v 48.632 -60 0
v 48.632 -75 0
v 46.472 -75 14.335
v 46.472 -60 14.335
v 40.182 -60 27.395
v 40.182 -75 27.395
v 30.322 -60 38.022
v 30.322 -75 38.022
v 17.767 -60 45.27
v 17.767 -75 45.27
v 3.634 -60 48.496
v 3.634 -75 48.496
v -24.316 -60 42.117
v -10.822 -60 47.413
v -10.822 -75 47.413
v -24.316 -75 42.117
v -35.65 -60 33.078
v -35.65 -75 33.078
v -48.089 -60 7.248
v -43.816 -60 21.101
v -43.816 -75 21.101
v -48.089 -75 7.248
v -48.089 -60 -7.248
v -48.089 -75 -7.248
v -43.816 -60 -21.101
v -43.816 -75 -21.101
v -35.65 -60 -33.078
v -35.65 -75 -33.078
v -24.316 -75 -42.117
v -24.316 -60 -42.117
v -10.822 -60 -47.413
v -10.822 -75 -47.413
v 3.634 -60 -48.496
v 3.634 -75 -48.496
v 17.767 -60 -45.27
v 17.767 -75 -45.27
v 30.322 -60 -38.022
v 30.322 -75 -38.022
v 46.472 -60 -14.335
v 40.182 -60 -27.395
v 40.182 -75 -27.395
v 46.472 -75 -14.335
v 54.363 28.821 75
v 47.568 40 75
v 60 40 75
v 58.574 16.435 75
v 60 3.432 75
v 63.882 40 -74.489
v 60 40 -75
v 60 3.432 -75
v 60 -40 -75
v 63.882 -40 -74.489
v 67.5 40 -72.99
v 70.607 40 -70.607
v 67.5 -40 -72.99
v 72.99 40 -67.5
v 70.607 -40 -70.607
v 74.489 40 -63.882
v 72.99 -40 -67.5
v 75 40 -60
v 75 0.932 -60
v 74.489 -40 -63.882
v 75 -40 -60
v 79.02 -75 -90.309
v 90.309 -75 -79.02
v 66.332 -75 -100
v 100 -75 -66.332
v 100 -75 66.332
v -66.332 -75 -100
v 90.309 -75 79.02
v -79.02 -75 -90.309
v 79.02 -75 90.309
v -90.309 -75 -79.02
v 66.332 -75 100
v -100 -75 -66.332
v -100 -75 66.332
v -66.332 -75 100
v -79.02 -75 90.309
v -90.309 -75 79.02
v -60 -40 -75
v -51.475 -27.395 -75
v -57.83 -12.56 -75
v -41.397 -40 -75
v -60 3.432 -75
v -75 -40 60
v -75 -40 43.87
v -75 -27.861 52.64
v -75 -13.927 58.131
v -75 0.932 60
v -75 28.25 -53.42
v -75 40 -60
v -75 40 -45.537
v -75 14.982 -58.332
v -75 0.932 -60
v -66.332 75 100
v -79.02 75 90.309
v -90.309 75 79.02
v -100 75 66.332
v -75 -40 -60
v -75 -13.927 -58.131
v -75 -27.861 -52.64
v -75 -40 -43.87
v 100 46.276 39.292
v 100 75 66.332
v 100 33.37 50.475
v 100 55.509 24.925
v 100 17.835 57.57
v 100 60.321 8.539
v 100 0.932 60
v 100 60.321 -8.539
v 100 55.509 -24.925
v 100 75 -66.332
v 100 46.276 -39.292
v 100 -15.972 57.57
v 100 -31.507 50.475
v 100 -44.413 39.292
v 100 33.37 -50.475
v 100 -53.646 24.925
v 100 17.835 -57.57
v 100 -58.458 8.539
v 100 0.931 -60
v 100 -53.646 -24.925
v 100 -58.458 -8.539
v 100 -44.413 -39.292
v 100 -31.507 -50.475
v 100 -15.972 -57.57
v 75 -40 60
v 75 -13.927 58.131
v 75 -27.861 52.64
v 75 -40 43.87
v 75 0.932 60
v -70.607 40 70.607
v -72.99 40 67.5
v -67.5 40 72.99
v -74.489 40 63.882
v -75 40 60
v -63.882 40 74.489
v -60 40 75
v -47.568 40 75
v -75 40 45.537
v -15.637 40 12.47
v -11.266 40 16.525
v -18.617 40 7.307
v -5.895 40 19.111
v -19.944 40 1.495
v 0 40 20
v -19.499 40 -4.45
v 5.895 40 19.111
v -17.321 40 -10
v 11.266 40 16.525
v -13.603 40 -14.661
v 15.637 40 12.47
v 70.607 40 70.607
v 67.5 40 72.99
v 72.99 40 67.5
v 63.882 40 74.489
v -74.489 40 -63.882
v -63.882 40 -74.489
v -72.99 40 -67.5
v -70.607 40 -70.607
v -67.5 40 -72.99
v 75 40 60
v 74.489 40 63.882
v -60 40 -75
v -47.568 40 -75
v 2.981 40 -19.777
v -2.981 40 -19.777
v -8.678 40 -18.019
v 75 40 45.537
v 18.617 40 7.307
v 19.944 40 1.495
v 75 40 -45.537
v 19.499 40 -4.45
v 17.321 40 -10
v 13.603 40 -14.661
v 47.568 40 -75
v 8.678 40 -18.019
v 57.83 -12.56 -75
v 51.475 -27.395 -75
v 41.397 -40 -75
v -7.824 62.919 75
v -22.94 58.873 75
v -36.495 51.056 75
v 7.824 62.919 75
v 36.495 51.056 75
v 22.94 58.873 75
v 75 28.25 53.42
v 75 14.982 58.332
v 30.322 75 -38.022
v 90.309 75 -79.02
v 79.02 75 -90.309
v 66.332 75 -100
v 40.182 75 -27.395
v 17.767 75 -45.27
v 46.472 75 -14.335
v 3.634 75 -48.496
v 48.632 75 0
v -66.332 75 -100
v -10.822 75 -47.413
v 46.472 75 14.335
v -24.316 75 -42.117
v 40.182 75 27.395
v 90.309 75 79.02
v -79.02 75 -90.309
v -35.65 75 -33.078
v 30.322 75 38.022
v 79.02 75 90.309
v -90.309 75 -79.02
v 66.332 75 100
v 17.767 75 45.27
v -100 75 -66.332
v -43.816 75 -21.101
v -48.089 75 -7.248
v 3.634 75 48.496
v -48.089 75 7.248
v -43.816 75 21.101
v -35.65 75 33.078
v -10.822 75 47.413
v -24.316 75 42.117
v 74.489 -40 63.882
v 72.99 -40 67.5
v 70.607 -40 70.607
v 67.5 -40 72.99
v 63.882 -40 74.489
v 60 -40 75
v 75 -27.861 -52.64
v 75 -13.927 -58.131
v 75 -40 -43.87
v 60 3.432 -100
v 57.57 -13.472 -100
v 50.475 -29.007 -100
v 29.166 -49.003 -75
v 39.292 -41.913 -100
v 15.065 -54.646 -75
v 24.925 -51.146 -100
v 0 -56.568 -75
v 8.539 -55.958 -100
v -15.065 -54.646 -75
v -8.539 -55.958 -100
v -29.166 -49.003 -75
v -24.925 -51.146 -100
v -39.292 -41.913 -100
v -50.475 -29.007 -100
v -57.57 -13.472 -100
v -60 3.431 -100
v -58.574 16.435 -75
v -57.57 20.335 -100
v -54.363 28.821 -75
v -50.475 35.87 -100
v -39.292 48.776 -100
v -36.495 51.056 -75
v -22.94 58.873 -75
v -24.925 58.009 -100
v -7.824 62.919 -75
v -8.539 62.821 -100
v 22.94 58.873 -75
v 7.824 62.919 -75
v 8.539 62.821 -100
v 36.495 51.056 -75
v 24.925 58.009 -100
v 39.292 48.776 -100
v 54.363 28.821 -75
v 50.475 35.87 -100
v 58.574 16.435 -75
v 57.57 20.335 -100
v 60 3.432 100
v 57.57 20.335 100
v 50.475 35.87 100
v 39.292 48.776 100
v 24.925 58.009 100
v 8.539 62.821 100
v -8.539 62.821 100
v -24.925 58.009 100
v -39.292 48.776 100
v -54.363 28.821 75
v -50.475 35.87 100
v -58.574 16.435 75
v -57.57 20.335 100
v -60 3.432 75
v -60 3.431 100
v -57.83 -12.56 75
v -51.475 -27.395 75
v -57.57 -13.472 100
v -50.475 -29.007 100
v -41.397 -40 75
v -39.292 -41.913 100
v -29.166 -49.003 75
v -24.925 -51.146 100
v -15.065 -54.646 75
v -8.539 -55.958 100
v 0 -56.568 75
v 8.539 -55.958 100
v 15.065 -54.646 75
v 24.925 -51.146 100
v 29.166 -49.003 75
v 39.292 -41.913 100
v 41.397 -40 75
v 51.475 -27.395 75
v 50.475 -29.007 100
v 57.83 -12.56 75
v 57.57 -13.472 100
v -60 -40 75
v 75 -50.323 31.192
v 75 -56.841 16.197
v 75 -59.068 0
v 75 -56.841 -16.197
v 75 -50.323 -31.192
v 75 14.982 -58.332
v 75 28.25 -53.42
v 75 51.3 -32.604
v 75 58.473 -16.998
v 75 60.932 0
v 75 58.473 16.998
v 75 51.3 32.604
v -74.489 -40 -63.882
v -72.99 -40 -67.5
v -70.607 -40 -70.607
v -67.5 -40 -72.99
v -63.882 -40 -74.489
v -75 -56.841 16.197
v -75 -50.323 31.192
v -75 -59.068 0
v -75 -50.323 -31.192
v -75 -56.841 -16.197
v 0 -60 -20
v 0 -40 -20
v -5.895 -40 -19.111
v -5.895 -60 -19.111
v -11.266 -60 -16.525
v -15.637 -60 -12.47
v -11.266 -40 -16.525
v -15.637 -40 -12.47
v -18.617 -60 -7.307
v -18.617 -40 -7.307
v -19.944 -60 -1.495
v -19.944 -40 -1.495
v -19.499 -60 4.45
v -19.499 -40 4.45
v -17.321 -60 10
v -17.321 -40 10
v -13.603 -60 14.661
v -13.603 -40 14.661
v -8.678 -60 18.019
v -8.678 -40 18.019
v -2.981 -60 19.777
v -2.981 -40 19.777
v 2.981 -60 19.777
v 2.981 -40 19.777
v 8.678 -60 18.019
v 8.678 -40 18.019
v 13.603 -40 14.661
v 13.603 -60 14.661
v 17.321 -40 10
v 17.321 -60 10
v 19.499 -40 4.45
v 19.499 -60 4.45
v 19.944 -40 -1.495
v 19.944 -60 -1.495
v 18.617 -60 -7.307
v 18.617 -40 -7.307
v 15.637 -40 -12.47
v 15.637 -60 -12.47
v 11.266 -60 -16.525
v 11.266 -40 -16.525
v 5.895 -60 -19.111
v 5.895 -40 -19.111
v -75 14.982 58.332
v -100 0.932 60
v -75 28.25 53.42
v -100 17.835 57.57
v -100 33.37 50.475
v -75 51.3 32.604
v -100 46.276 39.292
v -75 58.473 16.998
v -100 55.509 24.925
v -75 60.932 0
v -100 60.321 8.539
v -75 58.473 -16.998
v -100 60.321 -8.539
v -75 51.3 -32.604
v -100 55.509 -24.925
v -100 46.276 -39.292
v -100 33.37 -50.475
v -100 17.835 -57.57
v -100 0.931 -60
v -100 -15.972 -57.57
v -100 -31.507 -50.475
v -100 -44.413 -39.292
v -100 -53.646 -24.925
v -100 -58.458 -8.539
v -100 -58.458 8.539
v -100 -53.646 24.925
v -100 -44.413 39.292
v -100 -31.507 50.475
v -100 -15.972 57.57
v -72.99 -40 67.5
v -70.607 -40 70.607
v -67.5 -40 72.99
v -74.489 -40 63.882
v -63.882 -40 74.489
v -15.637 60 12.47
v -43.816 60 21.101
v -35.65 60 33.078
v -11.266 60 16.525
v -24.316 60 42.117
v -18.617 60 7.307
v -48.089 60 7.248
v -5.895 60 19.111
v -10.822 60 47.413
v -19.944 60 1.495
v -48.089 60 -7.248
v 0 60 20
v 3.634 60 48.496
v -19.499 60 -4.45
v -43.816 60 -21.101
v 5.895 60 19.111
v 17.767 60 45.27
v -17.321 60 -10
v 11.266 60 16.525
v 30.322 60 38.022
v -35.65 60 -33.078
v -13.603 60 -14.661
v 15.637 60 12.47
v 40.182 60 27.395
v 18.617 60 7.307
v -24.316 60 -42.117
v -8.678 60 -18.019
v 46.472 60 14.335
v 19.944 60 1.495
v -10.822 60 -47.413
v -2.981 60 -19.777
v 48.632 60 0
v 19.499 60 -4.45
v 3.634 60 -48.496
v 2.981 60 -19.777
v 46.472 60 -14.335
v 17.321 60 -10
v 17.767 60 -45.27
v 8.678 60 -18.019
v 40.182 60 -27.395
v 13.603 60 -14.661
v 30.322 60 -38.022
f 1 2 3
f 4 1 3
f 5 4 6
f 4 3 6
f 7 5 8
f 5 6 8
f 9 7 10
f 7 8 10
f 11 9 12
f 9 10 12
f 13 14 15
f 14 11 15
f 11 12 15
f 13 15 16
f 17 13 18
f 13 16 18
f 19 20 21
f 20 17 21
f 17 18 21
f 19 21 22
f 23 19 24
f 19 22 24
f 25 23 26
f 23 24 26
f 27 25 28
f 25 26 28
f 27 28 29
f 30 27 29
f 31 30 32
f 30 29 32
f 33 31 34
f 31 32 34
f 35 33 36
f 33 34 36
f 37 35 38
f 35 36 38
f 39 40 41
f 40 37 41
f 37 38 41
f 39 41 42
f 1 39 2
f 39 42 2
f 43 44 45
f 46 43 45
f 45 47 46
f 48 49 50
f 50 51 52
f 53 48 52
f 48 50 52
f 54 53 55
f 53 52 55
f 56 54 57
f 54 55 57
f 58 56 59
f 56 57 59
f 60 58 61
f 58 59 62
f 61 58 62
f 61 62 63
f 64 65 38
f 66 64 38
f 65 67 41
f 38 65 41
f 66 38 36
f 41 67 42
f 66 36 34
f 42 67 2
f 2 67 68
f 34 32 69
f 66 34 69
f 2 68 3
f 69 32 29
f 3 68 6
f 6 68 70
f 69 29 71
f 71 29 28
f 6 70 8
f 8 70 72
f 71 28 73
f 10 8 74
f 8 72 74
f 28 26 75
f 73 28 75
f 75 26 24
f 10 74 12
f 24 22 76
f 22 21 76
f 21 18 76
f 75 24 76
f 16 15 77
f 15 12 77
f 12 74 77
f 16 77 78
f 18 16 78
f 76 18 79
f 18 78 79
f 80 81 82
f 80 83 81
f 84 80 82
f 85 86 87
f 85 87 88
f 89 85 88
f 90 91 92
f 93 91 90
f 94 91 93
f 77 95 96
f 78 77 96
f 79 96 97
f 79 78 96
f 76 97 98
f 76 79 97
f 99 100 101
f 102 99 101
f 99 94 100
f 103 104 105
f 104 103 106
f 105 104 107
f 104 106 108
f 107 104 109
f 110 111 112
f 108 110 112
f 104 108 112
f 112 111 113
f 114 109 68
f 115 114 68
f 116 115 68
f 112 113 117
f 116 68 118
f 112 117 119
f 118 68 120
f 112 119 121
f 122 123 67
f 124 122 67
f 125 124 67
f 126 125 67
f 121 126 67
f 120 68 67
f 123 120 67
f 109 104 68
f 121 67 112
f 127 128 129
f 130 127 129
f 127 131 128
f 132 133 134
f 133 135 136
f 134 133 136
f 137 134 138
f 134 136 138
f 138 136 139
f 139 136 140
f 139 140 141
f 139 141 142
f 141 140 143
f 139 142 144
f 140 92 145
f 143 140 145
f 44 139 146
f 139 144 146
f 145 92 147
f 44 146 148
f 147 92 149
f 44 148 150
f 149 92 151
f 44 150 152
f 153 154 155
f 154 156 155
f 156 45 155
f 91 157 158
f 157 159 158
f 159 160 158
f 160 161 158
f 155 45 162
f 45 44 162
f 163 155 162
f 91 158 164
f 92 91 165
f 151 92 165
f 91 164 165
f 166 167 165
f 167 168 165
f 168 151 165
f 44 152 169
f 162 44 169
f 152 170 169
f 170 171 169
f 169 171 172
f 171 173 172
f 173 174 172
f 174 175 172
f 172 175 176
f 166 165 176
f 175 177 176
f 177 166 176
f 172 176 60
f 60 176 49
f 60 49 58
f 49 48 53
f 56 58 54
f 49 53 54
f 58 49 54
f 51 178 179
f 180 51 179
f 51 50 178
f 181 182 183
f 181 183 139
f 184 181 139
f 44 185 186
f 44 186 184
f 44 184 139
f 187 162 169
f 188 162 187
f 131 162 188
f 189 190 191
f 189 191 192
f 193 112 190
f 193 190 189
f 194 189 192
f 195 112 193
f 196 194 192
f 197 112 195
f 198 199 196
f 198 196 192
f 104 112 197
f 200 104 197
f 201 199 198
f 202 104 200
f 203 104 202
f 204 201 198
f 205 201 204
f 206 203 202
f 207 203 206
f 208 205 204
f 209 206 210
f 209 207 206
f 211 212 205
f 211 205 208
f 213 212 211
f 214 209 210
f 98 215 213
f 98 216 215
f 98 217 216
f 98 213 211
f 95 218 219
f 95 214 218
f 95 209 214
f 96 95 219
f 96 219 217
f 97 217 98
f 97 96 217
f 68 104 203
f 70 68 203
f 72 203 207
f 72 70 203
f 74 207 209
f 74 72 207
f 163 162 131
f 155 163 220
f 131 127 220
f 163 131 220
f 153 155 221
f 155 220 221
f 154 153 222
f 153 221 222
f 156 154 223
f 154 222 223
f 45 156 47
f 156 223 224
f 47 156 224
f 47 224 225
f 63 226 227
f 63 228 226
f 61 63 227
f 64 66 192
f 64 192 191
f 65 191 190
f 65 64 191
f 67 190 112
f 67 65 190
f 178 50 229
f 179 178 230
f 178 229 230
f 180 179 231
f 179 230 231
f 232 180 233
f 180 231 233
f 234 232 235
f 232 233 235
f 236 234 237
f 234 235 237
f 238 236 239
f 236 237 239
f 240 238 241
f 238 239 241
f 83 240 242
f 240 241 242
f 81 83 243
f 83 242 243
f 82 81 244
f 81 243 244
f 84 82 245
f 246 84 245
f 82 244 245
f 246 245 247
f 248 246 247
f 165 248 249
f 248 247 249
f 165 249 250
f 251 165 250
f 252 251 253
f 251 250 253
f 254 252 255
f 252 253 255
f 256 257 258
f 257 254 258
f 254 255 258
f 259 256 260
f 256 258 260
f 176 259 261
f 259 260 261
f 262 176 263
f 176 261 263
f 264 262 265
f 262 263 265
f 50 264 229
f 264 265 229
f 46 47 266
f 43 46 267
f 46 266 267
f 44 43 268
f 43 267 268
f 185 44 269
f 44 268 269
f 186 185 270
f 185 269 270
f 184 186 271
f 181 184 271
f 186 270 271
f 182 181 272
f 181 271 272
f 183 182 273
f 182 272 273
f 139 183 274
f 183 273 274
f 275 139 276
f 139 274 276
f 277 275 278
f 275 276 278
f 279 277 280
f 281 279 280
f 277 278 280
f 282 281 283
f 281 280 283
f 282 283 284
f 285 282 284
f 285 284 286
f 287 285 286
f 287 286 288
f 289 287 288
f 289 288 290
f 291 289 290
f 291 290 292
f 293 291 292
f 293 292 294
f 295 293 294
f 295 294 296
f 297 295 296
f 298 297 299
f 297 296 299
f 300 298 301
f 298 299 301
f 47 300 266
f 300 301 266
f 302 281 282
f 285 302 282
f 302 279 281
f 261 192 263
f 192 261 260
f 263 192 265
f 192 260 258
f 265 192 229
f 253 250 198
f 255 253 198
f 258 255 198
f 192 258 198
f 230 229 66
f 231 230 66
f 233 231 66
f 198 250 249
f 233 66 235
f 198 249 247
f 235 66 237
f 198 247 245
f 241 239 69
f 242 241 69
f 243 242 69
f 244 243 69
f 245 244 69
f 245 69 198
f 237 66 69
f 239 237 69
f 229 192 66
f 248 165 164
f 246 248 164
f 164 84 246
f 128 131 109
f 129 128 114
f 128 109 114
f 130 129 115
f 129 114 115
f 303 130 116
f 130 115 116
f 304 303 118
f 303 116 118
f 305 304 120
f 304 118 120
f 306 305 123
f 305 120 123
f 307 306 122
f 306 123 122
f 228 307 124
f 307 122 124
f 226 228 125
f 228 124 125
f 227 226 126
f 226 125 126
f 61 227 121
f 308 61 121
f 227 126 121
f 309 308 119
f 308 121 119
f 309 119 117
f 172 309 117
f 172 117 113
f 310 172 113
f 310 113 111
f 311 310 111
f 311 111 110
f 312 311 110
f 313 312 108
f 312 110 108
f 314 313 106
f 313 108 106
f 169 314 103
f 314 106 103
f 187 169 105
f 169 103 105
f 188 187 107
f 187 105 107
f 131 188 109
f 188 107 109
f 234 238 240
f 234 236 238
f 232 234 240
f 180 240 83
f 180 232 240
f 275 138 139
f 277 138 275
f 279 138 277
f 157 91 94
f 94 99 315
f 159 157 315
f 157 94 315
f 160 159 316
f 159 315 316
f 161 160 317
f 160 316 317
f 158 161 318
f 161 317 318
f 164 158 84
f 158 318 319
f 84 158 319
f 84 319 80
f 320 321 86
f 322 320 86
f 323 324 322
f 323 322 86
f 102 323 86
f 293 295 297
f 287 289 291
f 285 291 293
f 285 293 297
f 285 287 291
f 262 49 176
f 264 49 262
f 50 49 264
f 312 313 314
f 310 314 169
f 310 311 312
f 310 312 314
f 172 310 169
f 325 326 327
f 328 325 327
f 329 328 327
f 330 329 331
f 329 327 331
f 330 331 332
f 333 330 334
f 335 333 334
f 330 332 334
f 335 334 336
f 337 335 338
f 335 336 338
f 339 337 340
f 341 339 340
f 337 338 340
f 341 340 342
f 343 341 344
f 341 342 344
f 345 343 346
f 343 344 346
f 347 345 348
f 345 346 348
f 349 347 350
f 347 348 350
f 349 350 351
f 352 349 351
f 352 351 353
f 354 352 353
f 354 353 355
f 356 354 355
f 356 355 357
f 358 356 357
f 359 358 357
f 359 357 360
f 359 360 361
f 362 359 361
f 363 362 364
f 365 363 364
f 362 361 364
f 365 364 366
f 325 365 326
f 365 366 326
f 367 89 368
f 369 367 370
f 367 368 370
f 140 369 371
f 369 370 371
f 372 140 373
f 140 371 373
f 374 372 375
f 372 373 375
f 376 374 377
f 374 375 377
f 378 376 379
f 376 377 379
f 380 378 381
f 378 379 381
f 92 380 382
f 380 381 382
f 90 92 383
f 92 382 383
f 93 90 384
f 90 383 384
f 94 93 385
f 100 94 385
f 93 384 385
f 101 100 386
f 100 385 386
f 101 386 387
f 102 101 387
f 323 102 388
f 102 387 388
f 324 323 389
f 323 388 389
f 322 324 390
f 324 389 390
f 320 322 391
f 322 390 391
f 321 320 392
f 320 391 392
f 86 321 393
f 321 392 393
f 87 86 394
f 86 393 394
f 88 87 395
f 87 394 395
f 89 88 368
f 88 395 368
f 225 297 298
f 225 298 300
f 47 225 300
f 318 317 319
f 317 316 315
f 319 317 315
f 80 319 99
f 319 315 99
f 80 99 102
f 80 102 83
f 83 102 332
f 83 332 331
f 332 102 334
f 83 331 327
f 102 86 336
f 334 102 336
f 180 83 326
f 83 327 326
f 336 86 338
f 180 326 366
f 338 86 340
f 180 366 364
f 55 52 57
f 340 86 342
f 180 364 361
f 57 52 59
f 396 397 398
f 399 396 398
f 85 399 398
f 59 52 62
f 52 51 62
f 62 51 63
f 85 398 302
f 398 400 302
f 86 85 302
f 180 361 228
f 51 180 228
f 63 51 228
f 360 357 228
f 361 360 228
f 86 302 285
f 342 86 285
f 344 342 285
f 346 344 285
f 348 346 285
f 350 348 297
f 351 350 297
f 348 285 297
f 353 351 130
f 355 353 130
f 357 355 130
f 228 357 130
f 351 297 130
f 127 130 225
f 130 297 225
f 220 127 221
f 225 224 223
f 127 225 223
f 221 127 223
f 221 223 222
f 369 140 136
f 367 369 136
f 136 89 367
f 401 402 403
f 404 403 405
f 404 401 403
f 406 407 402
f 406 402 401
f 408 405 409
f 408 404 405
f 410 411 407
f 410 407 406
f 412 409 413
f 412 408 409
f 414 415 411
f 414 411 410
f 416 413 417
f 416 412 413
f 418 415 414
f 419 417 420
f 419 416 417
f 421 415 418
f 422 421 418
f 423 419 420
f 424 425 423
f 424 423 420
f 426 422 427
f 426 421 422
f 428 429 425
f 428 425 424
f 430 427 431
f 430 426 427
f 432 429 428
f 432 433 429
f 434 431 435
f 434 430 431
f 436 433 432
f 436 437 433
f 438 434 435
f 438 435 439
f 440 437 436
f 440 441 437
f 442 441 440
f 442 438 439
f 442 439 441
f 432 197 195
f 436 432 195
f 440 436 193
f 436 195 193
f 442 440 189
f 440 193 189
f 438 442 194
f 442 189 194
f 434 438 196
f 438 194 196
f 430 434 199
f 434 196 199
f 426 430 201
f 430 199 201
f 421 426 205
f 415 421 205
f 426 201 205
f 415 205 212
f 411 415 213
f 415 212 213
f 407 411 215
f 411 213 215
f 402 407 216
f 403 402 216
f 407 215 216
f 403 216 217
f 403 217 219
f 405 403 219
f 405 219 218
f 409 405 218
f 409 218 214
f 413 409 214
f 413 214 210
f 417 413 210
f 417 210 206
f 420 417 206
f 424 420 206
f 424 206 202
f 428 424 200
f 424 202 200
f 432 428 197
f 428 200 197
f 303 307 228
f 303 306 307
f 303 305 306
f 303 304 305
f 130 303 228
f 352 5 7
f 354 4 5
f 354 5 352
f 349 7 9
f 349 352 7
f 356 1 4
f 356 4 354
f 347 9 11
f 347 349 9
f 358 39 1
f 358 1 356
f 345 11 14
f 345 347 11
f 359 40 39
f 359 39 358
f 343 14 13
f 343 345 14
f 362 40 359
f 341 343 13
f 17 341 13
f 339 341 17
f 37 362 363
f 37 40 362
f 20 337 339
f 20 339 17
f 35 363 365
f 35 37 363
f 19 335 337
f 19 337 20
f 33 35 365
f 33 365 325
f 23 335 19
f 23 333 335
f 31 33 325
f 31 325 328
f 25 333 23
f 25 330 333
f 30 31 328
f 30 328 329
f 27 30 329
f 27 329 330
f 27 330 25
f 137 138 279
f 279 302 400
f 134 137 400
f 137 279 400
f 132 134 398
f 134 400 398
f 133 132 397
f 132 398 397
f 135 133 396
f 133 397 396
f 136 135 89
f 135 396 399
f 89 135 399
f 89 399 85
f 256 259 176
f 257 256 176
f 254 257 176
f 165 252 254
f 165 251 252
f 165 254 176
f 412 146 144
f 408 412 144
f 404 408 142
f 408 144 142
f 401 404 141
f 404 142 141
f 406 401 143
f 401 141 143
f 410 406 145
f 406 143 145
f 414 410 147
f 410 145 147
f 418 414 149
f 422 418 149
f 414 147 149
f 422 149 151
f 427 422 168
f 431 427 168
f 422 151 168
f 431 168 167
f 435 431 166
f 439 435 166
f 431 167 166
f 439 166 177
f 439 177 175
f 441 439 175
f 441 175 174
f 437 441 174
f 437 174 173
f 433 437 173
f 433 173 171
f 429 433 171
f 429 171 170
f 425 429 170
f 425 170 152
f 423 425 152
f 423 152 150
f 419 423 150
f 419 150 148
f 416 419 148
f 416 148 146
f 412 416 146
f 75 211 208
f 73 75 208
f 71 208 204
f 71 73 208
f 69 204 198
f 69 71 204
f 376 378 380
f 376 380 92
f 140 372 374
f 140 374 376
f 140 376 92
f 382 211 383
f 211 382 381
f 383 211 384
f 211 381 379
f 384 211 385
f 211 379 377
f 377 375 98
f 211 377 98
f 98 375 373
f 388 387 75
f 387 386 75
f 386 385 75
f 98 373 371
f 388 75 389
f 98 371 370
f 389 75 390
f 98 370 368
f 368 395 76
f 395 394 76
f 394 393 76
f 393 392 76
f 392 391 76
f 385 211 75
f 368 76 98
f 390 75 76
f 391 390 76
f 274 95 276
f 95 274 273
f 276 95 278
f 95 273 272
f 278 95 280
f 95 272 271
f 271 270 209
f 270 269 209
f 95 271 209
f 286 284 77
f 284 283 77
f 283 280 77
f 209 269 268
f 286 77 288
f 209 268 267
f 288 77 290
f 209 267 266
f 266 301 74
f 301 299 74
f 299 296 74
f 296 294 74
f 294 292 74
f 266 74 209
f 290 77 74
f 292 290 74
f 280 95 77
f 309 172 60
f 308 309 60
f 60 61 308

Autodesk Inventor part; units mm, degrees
ref_plane "YZ Plane" through (0, 0, 0) normal (1, 0, 0) x (0, 1, 0)
ref_plane "XZ Plane" through (0, 0, 0) normal (0, 1, 0) x (-1, 0, 0)
ref_plane "XY Plane" through (0, 0, 0) normal (0, 0, 1) x (1, 0, 0)
sketch "Sketch1" plane through (0, 0, 0) normal (0, 1, 0) x (-1, 0, 0)
  line L0 (-66.3325, -100) -> (66.3325, -100)
  line L1 (100, -66.3325) -> (100, 66.3325)
  line L2 (66.3325, 100) -> (-66.3325, 100)
  line L3 (-100, 66.3325) -> (-100, -66.3325)
  line L4 (-100, -100) -> (100, 100) construction
  line L5 (100, -100) -> (-100, 100) construction
  arc A0 (100, 66.3325) -> (66.3325, 100) centre (0, 0) ccw
  arc A1 (66.3325, -100) -> (100, -66.3325) centre (0, 0) ccw
  arc A2 (-66.3325, 100) -> (-100, 66.3325) centre (0, 0) ccw
  arc A3 (-100, -66.3325) -> (-66.3325, -100) centre (0, 0) ccw
  line L6 (60, 75) -> (-60, 75)
  line L7 (-75, 60) -> (-75, -60)
  line L8 (-60, -75) -> (60, -75)
  line L9 (75, -60) -> (75, 60)
  line L10 (75, 75) -> (-75, -75) construction
  line L11 (-75, 75) -> (75, -75) construction
  arc A4 (75, 60) -> (60, 75) centre (60, 60) ccw
  arc A5 (60, -75) -> (75, -60) centre (60, -60) ccw
  arc A6 (-75, -60) -> (-60, -75) centre (-60, -60) ccw
  arc A7 (-60, 75) -> (-75, 60) centre (-60, 60) ccw
  dimension "d0" = 200
  dimension "d1" = 200
  dimension "d3" = 150
  dimension "d4" = 150
  dimension "d5" = 15
extrude "Extrusion1" add sketch "Sketch1" along normal mid plane 150
sketch "Sketch2" plane through (0, 75, 0) normal (0, 1, 0) x (1, 0, 0)
  line L0 (66.3325, 100) -> (-66.3325, 100)
  line L1 (-100, 100) -> (-100, -66.3325)
  line L2 (-100, -100) -> (100, -100)
  line L3 (100, -66.3325) -> (100, 100)
  line L4 (100, 100) -> (-100, -100) construction
  line L5 (-100, 100) -> (100, -100) construction
  arc A0 (-100, -66.3325) -> (-66.3325, -100) centre (0, 0) ccw
  arc A1 (-66.3325, 100) -> (-100, 66.3325) centre (0, 0) ccw
  arc A2 (66.3325, -100) -> (100, -66.3325) centre (0, 0) ccw
  arc A3 (100, 66.3325) -> (66.3325, 100) centre (0, 0) ccw
  dimension "d8" = 200
  dimension "d9" = 200
extrude "Extrusion2" add sketch "Sketch2" against normal blind 35
hole "Hole1" at (0, 75, 0) direction (0, -1, 0) diameter 40 end through all
sketch "Sketch3" plane through (-66.3325, -75, 100) normal (0, 0, 1) x (1, 0, 0)
  line L0 (46.3325, 185) -> (86.3325, 185)
  line L1 (86.3325, 185) -> (86.3325, 135)
  line L2 (46.3325, 115) -> (46.3325, 185)
  line L3 (132.665, 150) -> (0, 150) projected
  line L4 (46.3325, 185) -> (86.3325, 115) construction
  line L5 (86.3325, 185) -> (46.3325, 115) construction
  line L6 (86.3325, 115) -> (86.3325, 150) projected
  line L7 (46.3325, 165) -> (86.3325, 165)
  line L8 (86.3325, 165) -> (86.3325, 135)
  line L9 (46.3325, 135) -> (46.3325, 165)
  line L10 (46.3325, 165) -> (86.3325, 135) construction
  line L11 (86.3325, 165) -> (46.3325, 135) construction
  line L12 (86.3325, 135) -> (66.3325, 78.4315)
  line L13 (86.3325, 115) -> (79.2614, 115)
  line L14 (66.3325, 115) -> (46.3325, 115)
  line L15 (86.3325, 135) -> (74.9039, 135)
  line L16 (66.3325, 135) -> (46.3325, 135)
  line L17 (66.3325, 75) -> (66.3325, 115)
  circle A0 centre (66.3325, 78.4315) radius 60
  point P0 (66.3325, 150)
  dimension "d21" = 40
  dimension "d22" = 70
  dimension "d23" = 30
  dimension "d24" = 60
extrude "Extrusion3" cut sketch "Sketch3" against normal blind 25 contours A0 L12 L17 L14 L2 | L2 L14 L17 L12 L13 L6 A0 | L6 L13 L12
mirror "Mirror1" about plane through (0, 0, 0) normal (0, 0, 1) of "Extrusion3"
sketch "Sketch4" plane through (-100, -75, -66.3325) normal (-1, 0, 0) x (0, 0, 1)
  line L0 (86.3325, 115) -> (86.3325, 150) projected
  line L1 (46.3325, 185) -> (86.3325, 185)
  line L2 (86.3325, 185) -> (86.3325, 132.5)
  line L3 (46.3325, 115) -> (46.3325, 185)
  line L4 (46.3325, 150) -> (86.3325, 150) projected
  line L5 (46.3325, 185) -> (86.3325, 115) construction
  line L6 (86.3325, 185) -> (46.3325, 115) construction
  line L7 (46.3325, 167.5) -> (86.3325, 167.5)
  line L8 (86.3325, 167.5) -> (86.3325, 132.5)
  line L9 (46.3325, 132.5) -> (46.3325, 167.5)
  line L10 (46.3325, 167.5) -> (86.3325, 132.5) construction
  line L11 (86.3325, 167.5) -> (46.3325, 132.5) construction
  line L12 (66.3325, 75) -> (66.3325, 115)
  line L13 (86.3325, 132.5) -> (66.3325, 75.9315)
  line L14 (86.3325, 132.5) -> (76.3325, 132.5)
  line L15 (56.3325, 132.5) -> (46.3325, 132.5)
  line L16 (66.3325, 115) -> (46.3325, 115)
  circle A0 centre (66.3325, 75.9315) radius 60
  point P0 (66.3325, 150)
  dimension "d27" = 60
extrude "Extrusion4" cut sketch "Sketch4" against normal blind 25 contours A0 L3 L16 L12 L13 | L13 L12 L16 L3 A0
mirror "Mirror2" about plane through (0, 0, 0) normal (1, 0, 0) of "Extrusion4"
sketch "Sketch5" plane through (0, 0, 0) normal (1, 0, 0) x (0, 1, 0)
  point P0 (0, 0)
sketch "Sketch6" plane through (0, -75, 0) normal (0, -1, 0) x (1, 0, 0)
  line L0 (-60, -75) -> (60, -75)
  line L1 (75, -60) -> (75, 60)
  line L2 (60, 75) -> (-60, 75)
  line L3 (-75, 60) -> (-75, -60)
  line L4 (-75, -75) -> (75, 75) construction
  line L5 (75, -75) -> (-75, 75) construction
  arc A0 (75, 60) -> (60, 75) centre (60, 60) ccw
  arc A1 (60, -75) -> (75, -60) centre (60, -60) ccw
  arc A2 (-75, -60) -> (-60, -75) centre (-60, -60) ccw
  arc A3 (-60, 75) -> (-75, 60) centre (-60, 60) ccw
  point P0 (0, 0)
  dimension "d21" = 40
  dimension "d30" = 150
  dimension "d31" = 150
  dimension "d32" = 15
extrude "Extrusion5" add sketch "Sketch6" against normal blind 35
hole "Hole2" at (0, -75, 0) direction (0, 1, 0) diameter 40 end through all
sketch "Sketch7" plane through (0, 0, 0) normal (0, 0, 1) x (1, 0, 0)
  line L0 (47.5683, 40) -> (-47.5683, 40) projected
  line L1 (66.3325, 75) -> (-66.3325, 75) projected
  point P0 (0, 0)
  point P1 (47.5683, 75)
sketch "Sketch8" plane through (0, 75, 0) normal (0, 1, 0) x (1, 0, 0)
  circle A0 centre (0, 0) radius 48.6322
extrude "Extrusion6" cut sketch "Sketch8" against normal blind 15
mirror "Mirror3" about plane through (0, 0, 0) normal (0, 1, 0) of "Extrusion6"
sketch "Sketch9" plane through (0, 0, 0) normal (0, 1, 0) x (-1, 0, 0)
  circle A0 centre (0, 0) radius 20
properties part number "hub"
